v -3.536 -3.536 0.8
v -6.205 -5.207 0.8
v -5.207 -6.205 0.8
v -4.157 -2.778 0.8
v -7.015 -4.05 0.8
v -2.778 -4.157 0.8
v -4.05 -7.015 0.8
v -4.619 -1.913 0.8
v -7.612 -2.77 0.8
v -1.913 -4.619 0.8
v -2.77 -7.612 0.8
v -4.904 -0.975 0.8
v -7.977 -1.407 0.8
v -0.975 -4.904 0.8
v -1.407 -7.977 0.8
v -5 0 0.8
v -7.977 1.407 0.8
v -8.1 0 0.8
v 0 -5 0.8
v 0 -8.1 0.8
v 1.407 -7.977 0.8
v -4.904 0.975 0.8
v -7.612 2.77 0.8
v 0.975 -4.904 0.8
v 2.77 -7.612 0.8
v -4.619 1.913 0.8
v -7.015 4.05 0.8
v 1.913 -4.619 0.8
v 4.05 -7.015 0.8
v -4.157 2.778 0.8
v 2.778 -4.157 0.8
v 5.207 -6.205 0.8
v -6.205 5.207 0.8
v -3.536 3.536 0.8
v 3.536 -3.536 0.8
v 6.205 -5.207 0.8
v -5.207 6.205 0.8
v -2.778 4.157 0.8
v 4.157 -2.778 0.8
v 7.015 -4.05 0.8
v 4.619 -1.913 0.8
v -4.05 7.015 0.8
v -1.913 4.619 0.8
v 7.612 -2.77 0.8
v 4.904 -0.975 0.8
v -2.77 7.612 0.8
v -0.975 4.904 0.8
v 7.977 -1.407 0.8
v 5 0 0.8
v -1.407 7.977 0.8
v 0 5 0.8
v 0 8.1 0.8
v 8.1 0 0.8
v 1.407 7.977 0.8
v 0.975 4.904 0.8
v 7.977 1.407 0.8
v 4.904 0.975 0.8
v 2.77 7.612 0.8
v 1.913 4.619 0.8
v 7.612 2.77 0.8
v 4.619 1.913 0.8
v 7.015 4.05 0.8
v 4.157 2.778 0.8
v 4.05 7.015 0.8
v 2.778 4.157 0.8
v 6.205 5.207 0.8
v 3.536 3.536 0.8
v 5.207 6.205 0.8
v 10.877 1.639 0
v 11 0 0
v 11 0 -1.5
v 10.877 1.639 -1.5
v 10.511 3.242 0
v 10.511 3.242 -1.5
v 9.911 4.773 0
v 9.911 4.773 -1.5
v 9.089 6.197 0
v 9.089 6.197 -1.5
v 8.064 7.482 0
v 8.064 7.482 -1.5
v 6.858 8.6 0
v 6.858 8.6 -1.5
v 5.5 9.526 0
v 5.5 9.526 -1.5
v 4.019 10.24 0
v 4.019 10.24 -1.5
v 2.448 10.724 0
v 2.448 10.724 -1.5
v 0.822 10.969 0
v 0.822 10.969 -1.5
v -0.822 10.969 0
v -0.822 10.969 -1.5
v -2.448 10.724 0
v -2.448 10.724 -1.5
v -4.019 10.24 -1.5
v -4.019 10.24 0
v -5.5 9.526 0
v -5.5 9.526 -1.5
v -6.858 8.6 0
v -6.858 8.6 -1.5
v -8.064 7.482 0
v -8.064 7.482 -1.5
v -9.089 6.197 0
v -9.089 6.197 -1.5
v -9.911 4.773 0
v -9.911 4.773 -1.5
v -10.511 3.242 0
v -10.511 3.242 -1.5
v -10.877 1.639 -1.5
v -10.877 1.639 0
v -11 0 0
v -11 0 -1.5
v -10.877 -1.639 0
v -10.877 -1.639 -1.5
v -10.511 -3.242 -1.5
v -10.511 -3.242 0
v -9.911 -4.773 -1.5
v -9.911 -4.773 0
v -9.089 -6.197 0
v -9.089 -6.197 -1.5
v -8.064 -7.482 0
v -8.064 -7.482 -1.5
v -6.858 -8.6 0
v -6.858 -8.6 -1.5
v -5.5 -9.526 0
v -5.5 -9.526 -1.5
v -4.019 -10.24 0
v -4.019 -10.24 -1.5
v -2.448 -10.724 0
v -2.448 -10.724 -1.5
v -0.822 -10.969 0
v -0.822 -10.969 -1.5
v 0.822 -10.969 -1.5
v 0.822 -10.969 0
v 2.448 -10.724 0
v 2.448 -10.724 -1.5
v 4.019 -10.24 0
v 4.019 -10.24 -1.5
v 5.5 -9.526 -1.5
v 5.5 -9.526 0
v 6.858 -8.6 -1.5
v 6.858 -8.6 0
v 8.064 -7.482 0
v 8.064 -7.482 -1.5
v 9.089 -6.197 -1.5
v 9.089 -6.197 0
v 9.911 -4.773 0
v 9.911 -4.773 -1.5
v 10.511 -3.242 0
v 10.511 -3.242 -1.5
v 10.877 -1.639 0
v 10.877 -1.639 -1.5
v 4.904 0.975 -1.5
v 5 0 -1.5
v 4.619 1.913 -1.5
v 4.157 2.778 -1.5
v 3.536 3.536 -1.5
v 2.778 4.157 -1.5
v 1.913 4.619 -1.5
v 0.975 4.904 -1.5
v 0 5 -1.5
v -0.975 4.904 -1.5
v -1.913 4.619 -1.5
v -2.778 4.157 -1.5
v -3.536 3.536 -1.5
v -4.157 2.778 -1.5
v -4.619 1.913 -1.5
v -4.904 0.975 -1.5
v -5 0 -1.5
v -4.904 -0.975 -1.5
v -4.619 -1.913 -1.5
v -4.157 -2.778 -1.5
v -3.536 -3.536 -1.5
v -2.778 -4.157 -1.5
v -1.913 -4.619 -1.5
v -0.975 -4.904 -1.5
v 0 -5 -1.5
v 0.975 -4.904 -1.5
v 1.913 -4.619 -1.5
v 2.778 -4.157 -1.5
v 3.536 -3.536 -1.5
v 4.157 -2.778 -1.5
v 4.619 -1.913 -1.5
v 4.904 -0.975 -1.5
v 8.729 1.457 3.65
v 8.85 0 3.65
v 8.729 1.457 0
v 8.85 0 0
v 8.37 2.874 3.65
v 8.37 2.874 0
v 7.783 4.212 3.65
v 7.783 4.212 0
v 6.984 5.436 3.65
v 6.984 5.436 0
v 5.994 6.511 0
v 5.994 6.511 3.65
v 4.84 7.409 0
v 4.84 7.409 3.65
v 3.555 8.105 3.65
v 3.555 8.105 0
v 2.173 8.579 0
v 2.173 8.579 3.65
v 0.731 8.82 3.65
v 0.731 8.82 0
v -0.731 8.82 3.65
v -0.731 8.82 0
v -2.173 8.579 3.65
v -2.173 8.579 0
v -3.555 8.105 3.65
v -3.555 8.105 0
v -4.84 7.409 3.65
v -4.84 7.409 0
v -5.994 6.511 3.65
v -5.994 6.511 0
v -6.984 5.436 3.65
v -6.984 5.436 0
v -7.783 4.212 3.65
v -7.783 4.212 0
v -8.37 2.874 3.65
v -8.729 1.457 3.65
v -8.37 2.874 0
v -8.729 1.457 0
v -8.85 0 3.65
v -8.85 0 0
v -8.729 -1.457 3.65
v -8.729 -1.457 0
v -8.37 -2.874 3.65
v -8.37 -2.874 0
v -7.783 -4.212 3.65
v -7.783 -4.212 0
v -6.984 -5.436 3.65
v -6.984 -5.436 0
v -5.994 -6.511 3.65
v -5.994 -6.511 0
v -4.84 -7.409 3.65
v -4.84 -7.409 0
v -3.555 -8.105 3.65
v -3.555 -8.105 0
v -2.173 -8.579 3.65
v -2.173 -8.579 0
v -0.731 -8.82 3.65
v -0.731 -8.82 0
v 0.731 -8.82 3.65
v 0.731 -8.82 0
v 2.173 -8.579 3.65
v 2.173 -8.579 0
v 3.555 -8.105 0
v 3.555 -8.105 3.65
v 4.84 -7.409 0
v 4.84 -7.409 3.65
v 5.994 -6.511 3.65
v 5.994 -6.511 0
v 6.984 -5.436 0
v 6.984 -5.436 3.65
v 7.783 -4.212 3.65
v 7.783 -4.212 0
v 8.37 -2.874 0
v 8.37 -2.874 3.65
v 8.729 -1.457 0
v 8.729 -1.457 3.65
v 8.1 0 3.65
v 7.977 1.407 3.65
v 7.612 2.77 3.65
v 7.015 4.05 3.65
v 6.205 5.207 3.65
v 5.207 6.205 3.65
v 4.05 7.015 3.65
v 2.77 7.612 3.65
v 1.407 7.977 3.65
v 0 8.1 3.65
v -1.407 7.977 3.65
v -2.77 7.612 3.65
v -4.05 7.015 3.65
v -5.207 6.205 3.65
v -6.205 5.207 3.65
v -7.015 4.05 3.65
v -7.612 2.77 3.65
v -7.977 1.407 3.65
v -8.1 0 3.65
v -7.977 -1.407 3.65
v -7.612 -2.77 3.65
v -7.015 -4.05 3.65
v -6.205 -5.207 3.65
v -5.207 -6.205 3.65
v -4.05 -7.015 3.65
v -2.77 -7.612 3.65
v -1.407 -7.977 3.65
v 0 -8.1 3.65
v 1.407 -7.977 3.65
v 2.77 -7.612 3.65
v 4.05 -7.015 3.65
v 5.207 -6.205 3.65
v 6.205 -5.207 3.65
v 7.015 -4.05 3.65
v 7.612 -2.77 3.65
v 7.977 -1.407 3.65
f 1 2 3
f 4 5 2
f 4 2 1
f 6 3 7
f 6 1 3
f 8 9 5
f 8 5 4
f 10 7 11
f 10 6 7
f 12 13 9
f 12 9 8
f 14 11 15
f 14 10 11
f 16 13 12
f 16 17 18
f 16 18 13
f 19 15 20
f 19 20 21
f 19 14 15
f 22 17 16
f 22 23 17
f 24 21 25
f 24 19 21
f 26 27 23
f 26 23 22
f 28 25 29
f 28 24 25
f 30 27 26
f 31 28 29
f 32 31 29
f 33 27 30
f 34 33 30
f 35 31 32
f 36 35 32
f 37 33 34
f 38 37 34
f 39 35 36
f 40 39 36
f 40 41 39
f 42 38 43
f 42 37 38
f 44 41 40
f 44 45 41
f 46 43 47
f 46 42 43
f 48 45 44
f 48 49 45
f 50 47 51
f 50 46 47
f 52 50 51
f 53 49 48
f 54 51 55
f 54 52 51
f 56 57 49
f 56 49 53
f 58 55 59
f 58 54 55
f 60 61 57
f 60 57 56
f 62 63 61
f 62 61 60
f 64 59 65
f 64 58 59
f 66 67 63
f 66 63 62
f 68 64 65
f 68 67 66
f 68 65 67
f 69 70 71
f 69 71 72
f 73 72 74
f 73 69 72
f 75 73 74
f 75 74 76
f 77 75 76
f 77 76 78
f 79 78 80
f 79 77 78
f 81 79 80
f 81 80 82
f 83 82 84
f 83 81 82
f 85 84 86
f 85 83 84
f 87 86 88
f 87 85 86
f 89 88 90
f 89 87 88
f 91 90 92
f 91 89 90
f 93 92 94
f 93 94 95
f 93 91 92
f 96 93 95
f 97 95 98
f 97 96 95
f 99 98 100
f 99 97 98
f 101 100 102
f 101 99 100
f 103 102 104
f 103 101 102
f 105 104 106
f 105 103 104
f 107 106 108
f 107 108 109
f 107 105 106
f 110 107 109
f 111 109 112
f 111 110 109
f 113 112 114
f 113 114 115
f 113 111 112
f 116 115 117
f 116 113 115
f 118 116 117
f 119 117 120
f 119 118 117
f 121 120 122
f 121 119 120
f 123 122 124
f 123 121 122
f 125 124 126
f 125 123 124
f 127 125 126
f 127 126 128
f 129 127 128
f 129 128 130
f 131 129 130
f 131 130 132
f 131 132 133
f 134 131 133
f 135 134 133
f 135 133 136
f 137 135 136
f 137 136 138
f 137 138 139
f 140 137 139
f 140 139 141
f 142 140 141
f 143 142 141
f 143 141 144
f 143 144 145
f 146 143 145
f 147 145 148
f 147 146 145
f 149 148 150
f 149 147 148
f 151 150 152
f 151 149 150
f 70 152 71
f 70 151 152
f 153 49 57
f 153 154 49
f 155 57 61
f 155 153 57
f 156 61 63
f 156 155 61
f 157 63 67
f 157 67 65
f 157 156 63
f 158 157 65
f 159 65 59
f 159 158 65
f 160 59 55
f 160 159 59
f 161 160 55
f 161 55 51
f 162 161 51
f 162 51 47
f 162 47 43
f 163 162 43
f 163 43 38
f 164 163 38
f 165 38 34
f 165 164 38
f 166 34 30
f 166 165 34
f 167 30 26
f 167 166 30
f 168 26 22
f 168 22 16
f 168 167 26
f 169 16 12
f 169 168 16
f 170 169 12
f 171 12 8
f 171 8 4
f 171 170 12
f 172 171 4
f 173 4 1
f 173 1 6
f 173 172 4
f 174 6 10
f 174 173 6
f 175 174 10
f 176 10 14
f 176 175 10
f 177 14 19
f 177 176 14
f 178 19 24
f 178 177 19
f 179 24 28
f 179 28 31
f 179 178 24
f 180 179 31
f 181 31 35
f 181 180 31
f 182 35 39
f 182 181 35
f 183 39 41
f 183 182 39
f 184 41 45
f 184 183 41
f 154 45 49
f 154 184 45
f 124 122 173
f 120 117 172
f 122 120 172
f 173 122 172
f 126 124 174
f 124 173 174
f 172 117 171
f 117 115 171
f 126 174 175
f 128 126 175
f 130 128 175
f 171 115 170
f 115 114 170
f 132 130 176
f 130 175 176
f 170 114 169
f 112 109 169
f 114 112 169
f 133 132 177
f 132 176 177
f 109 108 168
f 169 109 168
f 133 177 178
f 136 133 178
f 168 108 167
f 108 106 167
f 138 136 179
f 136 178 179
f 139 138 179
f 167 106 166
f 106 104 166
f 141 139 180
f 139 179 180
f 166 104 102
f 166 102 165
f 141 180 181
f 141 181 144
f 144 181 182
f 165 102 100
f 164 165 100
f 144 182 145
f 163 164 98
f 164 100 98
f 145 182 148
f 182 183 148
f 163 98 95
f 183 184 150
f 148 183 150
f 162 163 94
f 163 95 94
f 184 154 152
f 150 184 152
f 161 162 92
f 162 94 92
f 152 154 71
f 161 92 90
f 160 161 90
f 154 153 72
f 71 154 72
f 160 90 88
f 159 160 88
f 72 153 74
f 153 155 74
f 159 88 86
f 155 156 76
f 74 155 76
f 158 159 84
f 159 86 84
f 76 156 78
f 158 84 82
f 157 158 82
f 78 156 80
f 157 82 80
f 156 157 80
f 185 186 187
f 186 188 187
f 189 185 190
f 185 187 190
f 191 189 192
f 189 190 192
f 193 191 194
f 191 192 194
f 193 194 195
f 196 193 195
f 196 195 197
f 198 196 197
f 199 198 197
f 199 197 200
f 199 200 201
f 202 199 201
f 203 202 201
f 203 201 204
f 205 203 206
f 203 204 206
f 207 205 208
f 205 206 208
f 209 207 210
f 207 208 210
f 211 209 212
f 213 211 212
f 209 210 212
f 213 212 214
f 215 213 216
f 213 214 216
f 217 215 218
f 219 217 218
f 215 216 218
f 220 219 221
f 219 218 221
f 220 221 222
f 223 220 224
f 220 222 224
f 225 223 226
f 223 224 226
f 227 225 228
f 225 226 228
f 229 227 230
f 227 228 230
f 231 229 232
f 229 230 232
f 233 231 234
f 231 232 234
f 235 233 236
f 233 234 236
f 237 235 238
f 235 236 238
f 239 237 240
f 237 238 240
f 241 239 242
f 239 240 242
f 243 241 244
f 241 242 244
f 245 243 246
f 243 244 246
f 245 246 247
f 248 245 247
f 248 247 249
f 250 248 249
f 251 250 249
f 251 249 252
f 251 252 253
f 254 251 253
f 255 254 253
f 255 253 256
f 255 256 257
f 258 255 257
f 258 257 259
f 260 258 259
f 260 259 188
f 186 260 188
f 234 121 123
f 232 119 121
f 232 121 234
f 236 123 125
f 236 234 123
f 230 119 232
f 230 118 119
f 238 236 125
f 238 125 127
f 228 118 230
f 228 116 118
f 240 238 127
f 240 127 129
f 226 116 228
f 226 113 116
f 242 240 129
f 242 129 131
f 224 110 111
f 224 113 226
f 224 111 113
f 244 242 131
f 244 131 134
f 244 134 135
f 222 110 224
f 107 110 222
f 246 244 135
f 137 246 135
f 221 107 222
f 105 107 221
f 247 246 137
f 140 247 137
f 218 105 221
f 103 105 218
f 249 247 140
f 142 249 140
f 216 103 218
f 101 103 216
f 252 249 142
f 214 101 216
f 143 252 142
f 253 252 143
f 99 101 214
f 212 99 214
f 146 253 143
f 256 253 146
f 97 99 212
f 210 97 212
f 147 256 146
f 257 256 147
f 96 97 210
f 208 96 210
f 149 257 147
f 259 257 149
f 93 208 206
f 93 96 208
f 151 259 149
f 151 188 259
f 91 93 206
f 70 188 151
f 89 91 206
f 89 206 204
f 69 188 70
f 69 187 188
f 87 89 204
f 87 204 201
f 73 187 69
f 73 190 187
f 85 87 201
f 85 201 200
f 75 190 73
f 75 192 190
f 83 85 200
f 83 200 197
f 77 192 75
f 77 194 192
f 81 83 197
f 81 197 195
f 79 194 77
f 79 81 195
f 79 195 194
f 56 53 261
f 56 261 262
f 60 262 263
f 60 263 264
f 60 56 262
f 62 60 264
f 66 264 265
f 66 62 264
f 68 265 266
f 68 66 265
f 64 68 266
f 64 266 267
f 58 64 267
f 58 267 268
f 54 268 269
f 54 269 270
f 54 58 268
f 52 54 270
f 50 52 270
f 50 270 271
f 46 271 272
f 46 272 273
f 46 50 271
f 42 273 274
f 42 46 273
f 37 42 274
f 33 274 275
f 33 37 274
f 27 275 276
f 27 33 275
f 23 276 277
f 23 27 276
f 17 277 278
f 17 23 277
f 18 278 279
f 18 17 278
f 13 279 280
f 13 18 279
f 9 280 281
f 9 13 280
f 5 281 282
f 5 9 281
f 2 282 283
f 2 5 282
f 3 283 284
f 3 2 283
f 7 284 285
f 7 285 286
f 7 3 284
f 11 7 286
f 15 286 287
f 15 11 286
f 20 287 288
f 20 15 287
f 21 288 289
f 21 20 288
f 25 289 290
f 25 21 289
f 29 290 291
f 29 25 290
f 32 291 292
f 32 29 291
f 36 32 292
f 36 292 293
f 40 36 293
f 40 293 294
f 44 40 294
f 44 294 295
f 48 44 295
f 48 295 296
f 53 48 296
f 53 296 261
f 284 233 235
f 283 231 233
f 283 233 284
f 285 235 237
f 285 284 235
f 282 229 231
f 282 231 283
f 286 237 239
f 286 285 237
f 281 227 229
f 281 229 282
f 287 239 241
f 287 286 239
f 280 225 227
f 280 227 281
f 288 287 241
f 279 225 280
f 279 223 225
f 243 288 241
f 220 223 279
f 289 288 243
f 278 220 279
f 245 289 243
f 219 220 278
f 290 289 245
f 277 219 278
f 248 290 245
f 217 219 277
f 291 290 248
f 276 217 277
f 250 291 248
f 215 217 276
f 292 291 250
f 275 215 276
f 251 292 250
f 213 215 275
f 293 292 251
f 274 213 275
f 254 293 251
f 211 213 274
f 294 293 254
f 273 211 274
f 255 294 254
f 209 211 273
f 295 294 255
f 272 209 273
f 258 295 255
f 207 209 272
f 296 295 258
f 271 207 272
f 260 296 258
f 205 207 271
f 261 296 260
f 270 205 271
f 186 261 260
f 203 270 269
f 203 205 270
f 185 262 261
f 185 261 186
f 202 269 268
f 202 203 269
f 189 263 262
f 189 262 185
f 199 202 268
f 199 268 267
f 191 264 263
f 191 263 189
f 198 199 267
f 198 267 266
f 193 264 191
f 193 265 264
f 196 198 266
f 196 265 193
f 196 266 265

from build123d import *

# Parameters (mm, degrees)
F0_R     = 11
F0_R_2   = 8.85
F0_R_3   = 8.1
F0_R_4   = 5
F1_DEPTH = 1.5
F2_DEPTH = 2.65
F3_DEPTH = 1
F4_DEPTH = 0.8


with BuildPart() as f1:
    # F0 (on Top) → F1 (new body)
    with BuildSketch(Plane.XY):
        Circle(F0_R)
        Circle(F0_R_2, mode=Mode.SUBTRACT)
        Circle(F0_R_2)
        Circle(F0_R_3, mode=Mode.SUBTRACT)
        Circle(F0_R_3)
        Circle(F0_R_4, mode=Mode.SUBTRACT)
    extrude(amount=-F1_DEPTH)

    # F0 (on Top) → F2 (join)
    with BuildSketch(Plane.XY):
        Circle(F0_R_2)
        Circle(F0_R_3, mode=Mode.SUBTRACT)
    extrude(amount=F2_DEPTH)

    # F3 (add): a face of the model
    f3_faces = [f1.faces().sort_by_distance(p)[0] for p in [
        (-8.5996841995, 0, 2.65),
    ]]
    extrude(f3_faces, amount=F3_DEPTH)

    # F4 (add): a face of the model
    f4_faces = [f1.faces().sort_by_distance(p)[0] for p in [
        (-7.8708974029, 0, 0),
    ]]
    extrude(f4_faces, amount=F4_DEPTH)


solid = f1.part
